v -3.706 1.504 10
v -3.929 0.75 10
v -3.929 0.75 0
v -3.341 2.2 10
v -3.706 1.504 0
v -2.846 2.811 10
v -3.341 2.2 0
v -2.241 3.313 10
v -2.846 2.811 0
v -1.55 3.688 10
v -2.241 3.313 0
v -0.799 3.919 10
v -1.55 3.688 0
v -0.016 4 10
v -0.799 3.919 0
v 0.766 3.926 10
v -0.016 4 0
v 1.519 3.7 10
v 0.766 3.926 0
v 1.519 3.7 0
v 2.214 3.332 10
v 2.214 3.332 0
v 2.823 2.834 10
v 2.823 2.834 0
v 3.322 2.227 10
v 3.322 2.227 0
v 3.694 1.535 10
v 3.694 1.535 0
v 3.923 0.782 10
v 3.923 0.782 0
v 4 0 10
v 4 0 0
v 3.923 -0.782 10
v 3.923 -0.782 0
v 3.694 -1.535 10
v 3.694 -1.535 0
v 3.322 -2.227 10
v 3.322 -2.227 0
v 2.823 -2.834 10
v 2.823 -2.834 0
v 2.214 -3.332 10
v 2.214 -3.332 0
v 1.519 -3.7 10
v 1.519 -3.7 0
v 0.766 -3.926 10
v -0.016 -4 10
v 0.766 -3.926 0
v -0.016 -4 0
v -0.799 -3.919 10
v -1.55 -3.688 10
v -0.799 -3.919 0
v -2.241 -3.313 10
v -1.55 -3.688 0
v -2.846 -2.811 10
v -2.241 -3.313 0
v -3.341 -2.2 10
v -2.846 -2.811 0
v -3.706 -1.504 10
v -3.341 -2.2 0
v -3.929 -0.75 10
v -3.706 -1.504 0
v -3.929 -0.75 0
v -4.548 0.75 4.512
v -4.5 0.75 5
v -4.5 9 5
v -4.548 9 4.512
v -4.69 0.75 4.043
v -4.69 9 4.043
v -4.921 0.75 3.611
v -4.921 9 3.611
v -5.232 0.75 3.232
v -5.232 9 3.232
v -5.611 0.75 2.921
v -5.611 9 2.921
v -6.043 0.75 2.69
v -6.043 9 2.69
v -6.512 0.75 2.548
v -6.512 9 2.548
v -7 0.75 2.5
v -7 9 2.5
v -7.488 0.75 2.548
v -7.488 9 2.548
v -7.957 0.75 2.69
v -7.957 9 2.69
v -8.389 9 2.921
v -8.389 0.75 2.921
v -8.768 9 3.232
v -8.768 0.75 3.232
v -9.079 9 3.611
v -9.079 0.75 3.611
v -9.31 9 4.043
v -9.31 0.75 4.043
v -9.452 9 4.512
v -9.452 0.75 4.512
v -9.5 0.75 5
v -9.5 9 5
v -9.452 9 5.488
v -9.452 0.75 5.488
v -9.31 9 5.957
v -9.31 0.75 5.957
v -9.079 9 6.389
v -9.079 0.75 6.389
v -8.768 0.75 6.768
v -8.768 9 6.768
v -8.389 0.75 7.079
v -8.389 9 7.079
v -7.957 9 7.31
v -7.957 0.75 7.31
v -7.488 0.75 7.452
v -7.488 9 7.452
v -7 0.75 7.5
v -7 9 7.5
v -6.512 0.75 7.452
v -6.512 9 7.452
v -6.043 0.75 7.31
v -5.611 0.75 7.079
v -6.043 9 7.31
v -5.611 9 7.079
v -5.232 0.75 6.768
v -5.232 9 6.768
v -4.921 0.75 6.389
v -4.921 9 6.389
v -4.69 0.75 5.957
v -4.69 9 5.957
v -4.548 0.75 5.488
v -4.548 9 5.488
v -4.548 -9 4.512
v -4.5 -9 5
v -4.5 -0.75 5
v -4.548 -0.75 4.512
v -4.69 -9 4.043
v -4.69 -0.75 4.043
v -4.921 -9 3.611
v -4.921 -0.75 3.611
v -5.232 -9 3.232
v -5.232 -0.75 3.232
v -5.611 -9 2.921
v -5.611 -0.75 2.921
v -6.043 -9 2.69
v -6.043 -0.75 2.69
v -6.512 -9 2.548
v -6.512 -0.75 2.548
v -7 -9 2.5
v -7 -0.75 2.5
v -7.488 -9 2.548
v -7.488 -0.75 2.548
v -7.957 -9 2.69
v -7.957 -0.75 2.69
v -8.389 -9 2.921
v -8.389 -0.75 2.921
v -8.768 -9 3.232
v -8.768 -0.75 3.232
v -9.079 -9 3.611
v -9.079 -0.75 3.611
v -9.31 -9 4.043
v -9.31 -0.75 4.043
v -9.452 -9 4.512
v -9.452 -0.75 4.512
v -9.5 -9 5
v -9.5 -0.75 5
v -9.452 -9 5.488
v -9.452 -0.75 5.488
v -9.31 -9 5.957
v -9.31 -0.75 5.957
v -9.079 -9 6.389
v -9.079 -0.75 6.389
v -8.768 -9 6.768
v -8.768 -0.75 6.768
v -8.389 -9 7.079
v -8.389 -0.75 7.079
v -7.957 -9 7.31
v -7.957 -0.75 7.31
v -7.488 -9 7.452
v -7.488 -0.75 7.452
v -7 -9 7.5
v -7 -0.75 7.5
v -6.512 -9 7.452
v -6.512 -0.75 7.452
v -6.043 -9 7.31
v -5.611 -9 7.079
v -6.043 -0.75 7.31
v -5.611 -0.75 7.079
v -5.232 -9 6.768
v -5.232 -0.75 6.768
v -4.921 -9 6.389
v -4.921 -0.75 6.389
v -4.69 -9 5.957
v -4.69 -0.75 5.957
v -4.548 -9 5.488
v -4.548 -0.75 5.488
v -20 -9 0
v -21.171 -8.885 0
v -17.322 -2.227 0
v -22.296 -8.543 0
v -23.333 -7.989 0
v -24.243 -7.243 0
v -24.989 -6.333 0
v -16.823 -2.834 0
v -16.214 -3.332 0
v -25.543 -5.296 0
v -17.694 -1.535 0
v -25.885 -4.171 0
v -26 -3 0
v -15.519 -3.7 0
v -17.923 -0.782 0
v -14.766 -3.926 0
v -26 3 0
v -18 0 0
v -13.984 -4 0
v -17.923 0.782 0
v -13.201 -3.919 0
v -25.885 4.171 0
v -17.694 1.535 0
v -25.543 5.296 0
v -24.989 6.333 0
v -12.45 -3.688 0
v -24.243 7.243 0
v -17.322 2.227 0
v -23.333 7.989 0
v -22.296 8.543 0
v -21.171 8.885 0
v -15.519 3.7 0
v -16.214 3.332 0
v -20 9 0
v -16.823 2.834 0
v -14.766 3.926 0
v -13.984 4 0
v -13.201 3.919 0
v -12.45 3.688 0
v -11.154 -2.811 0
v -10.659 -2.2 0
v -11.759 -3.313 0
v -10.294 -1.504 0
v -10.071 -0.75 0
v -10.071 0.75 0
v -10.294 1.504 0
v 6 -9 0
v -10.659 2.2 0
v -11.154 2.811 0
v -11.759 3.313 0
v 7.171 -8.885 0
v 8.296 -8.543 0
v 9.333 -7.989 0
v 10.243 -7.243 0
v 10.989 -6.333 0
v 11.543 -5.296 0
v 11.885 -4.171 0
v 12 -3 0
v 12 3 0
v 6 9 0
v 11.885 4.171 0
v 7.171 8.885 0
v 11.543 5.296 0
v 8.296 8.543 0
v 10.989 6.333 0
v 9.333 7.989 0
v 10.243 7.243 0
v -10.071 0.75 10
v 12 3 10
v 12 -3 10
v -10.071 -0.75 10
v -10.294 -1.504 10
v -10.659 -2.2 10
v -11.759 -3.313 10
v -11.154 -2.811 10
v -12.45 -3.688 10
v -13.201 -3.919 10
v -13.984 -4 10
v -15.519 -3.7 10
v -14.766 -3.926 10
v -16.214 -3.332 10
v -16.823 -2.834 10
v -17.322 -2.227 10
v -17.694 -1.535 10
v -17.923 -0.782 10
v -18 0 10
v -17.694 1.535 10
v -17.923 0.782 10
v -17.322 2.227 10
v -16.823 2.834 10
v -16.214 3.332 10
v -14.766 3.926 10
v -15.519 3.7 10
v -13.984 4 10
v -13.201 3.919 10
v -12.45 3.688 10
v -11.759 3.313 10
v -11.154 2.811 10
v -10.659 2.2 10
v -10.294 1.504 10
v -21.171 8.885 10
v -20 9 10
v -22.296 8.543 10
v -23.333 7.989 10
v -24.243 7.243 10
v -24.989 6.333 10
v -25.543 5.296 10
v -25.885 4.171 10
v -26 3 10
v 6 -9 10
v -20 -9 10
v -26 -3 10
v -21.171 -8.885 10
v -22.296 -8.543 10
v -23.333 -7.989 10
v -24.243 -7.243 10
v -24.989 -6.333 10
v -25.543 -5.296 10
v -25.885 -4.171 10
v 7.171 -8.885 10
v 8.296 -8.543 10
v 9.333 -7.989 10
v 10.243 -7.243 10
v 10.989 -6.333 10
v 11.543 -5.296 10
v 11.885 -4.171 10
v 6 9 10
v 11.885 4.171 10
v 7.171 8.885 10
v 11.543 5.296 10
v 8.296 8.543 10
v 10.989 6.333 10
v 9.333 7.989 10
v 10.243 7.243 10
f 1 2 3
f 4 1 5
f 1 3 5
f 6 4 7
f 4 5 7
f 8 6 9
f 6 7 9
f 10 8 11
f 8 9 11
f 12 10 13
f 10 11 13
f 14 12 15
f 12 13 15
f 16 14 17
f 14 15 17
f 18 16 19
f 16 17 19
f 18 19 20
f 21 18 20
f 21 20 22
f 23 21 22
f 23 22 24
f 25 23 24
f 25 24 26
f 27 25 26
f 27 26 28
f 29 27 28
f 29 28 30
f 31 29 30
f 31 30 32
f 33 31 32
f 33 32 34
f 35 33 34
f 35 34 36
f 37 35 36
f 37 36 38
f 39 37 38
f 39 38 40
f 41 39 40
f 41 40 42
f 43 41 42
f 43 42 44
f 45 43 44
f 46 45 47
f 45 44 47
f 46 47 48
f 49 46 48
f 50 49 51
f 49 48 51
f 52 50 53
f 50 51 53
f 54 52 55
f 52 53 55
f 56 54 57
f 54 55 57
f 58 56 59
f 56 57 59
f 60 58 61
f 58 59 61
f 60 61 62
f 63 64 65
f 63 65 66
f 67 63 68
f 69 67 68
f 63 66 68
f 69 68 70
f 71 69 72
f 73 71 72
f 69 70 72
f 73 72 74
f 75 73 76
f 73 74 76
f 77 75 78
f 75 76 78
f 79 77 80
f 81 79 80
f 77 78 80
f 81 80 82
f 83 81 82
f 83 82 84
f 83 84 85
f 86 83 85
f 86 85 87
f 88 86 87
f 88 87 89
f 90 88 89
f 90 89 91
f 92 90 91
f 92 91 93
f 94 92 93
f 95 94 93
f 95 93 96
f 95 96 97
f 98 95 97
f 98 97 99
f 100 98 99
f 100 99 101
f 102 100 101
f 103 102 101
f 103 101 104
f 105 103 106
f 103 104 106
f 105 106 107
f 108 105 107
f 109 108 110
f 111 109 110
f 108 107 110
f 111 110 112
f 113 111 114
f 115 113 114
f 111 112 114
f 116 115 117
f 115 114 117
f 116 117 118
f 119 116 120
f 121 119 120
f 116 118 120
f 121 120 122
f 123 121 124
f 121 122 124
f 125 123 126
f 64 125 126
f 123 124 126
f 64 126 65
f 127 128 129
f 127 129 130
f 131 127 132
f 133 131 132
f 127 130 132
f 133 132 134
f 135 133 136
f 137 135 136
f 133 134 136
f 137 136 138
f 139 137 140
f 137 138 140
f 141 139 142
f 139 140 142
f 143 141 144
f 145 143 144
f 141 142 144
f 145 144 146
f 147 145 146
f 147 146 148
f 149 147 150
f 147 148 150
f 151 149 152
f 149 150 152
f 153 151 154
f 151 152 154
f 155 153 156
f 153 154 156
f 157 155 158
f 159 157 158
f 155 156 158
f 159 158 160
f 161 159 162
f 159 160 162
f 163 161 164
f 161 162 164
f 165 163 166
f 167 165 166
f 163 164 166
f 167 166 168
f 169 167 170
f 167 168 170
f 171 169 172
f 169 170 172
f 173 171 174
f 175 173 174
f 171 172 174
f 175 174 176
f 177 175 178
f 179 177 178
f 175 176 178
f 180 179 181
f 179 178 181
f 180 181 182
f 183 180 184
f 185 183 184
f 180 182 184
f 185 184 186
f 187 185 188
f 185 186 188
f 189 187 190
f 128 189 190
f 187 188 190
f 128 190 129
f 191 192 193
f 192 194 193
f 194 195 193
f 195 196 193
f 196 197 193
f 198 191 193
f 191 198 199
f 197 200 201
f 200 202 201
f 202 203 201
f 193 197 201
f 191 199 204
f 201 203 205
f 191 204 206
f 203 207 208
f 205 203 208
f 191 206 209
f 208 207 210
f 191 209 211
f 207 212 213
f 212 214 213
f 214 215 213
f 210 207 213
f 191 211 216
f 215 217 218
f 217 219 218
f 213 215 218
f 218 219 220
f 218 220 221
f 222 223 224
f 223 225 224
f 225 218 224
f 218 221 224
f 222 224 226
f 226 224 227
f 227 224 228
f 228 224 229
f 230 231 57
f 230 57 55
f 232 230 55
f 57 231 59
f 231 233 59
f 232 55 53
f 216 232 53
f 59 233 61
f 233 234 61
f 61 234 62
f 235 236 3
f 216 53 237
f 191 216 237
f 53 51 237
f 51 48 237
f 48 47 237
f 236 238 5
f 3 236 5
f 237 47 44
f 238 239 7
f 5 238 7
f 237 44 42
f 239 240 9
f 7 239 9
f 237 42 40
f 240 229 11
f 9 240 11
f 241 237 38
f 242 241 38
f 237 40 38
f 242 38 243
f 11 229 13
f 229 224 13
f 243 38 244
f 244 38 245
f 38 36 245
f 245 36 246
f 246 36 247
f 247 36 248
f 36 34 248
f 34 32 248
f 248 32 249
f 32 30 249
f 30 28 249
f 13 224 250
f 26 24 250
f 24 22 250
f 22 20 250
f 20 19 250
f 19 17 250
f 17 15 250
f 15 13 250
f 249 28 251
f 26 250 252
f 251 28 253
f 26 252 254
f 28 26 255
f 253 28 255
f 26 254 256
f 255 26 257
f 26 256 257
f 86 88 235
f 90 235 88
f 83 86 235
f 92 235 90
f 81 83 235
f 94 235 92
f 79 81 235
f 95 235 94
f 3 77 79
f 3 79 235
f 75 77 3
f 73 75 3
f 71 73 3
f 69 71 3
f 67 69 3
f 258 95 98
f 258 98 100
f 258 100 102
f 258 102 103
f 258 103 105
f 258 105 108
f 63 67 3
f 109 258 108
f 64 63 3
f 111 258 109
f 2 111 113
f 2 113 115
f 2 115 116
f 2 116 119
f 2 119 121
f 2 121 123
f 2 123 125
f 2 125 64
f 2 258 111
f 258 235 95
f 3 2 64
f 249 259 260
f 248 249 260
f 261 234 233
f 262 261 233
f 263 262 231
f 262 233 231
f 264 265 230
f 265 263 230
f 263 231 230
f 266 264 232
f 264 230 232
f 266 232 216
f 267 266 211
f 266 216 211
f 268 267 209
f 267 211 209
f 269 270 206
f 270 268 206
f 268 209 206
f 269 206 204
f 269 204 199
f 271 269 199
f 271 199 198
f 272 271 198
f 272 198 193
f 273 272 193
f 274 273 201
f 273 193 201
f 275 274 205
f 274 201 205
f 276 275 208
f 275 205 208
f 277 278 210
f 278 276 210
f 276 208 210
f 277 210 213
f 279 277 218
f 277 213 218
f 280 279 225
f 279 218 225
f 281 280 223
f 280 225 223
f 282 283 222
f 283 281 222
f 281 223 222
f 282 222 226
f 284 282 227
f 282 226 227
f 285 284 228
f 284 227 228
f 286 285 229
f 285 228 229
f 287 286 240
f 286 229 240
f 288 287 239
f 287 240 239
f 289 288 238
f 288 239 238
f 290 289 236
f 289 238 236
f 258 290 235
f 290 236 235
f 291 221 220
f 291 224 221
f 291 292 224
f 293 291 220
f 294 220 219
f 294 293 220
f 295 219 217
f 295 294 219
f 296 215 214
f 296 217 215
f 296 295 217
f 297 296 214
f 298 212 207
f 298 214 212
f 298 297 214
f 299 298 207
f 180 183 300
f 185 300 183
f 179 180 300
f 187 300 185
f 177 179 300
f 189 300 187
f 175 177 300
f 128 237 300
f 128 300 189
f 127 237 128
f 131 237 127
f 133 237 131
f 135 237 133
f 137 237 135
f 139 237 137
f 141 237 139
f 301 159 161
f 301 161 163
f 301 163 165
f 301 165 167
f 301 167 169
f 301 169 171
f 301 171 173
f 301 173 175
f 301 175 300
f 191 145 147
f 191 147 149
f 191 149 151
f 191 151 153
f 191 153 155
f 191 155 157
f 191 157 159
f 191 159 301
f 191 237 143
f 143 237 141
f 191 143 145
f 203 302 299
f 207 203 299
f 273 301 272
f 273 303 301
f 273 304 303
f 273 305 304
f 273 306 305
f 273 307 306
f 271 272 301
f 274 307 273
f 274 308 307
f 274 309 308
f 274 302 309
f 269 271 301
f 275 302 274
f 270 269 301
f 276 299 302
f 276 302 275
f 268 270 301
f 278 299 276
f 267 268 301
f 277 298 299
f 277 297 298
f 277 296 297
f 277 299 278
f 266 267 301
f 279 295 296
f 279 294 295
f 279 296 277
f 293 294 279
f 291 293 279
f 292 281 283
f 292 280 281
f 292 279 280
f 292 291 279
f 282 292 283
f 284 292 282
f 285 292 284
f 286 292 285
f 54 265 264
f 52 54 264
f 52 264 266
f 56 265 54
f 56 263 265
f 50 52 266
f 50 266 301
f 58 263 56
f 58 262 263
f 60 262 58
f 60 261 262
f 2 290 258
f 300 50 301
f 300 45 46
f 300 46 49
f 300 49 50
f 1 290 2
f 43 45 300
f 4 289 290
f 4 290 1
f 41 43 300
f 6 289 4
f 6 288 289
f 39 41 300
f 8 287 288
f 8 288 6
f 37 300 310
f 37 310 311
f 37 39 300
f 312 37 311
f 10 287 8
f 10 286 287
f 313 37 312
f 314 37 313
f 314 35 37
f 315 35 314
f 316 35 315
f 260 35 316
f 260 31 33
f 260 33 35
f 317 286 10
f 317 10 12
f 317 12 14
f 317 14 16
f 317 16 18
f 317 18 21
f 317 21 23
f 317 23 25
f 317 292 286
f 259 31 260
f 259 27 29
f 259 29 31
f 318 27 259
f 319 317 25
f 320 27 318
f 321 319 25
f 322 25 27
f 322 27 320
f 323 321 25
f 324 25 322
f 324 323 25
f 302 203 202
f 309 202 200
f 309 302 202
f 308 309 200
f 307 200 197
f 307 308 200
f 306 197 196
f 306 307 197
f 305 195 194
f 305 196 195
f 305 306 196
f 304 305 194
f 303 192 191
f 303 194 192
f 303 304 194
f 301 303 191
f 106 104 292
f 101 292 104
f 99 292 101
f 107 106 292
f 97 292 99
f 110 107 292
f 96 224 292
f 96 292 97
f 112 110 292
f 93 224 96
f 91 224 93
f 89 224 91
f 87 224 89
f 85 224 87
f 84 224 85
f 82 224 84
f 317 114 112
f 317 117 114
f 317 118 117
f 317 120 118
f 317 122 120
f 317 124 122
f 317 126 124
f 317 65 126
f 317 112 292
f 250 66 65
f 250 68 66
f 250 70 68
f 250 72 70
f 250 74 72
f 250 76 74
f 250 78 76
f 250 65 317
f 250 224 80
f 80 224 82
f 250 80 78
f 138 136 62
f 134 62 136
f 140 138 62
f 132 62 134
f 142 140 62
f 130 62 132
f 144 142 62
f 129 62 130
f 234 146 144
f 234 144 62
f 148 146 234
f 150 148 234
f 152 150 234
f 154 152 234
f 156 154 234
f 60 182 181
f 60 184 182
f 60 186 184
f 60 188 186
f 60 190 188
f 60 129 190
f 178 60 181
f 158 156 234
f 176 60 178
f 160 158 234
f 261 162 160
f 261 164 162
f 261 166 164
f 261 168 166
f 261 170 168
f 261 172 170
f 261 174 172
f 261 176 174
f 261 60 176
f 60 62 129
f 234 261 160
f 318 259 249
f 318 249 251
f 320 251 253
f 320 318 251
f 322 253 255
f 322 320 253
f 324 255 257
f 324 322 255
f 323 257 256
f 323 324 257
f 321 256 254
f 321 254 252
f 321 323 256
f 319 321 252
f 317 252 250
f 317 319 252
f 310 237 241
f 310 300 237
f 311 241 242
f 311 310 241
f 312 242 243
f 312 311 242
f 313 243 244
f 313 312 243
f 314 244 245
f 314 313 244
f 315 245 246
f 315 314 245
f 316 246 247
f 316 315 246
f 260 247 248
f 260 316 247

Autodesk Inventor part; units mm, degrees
ref_plane "YZ Plane" through (0, 0, 0) normal (1, 0, 0) x (0, 1, 0)
ref_plane "XZ Plane" through (0, 0, 0) normal (0, 1, 0) x (-1, 0, 0)
ref_plane "XY Plane" through (0, 0, 0) normal (0, 0, 1) x (1, 0, 0)
sketch "Sketch1" plane through (0, 0, 0) normal (0, 0, 1) x (1, 0, 0)
  line L0 (0, 0) -> (-14, 0) construction
  circle A0 centre (-14, 0) radius 4
  circle A1 centre (0, 0) radius 4
  line L1 (12, -9) -> (-26, -9)
  line L2 (-26, -9) -> (-26, 9)
  line L3 (-26, 9) -> (12, 9)
  line L4 (12, 9) -> (12, -9)
  line L5 (12, -9) -> (-26, 9) construction
  line L6 (-26, -9) -> (12, 9) construction
  point P0 (-7, 0)
  dimension "d0" = 8
  dimension "d1" = 14
  dimension "d2" = 12
  dimension "d3" = 18
  dimension "d13" = 38
extrude "Extrusion1" add sketch "Sketch1" along normal blind 10
sketch "Sketch2" plane through (-26, 9, 0) normal (0, 1, 0) x (1, 0, 0)
  circle A0 centre (19, -5) radius 2.5
  line L0 (19, -5) -> (0, -5) construction
  line L1 (0, 0) -> (0, -10) construction
  point P0 (26, 0)
  dimension "d6" = 5
  dimension "d17" = 19
extrude "Extrusion2" cut sketch "Sketch2" against normal through all
fillet "Fillet1" radius 6 4 edges at (12, 9, 5) (-26, 9, 5) (-26, -9, 5) (12, -9, 5)
sketch "Sketch3" plane through (0, 0, 10) normal (0, 0, 1) x (1, 0, 0)
  line L0 (-20, -9) -> (6, -9) projected
  circle A0 centre (0, 0) radius 4 projected
  circle A1 centre (-14, 0) radius 4 projected
  line L1 (-14, 0) -> (0, 0) construction
  line L2 (0, -0.75) -> (-14, -0.75)
  line L3 (-14, -0.75) -> (-14, 0.75)
  line L4 (-14, 0.75) -> (0, 0.75)
  line L5 (0, 0.75) -> (0, -0.75)
  line L6 (0, -0.75) -> (-14, 0.75) construction
  line L7 (-14, -0.75) -> (0, 0.75) construction
  point P0 (-7, 0)
  dimension "d10" = 1.5
extrude "Extrusion3" cut sketch "Sketch3" against normal through all contours L4 L5 L2 A0 | A0 L2 A1 L4 | A1 L2 L3 L4 picked at (-1.3307, -0.0838) picked at (-12.6667, 0)
sketch "Sketch4" plane through (0, 0, 10) normal (0, 0, 1) x (1, 0, 0)
  line L0 (-10.0709, 0.75) -> (-3.9291, 0.75) construction
  arc A0 (-3.9291, -0.75) -> (-3.9291, 0.75) centre (0, 0) ccw construction
  line L1 (-3.9291, -0.75) -> (-10.0709, -0.75) construction
  arc A1 (-10.0709, 0.75) -> (-10.0709, -0.75) centre (-14, 0) ccw construction
  arc A2 (6, -9) -> (12, -3) centre (6, -3) ccw construction
  line L2 (12, -3) -> (12, 3) construction
  arc A3 (12, 3) -> (6, 9) centre (6, 3) ccw construction
  line L3 (6, 9) -> (-20, 9) construction
  arc A4 (-20, 9) -> (-26, 3) centre (-20, 3) ccw construction
  line L4 (-26, 3) -> (-26, -3) construction
  arc A5 (-26, -3) -> (-20, -9) centre (-20, -3) ccw construction
  line L5 (-20, -9) -> (6, -9) construction
  line L6 (-9.2375, -4.7625) -> (-18.7625, -4.7625)
  line L7 (-18.7625, -4.7625) -> (-18.7625, 4.7625)
  line L8 (-18.7625, 4.7625) -> (-9.2375, 4.7625)
  line L9 (-9.2375, 4.7625) -> (-9.2375, -4.7625)
  line L10 (-9.2375, -4.7625) -> (-18.7625, 4.7625) construction
  line L11 (-18.7625, -4.7625) -> (-9.2375, 4.7625) construction
  dimension "d14" = 9.525
extrude "Extrusion4" [suppressed]
properties part number "crank web2"
